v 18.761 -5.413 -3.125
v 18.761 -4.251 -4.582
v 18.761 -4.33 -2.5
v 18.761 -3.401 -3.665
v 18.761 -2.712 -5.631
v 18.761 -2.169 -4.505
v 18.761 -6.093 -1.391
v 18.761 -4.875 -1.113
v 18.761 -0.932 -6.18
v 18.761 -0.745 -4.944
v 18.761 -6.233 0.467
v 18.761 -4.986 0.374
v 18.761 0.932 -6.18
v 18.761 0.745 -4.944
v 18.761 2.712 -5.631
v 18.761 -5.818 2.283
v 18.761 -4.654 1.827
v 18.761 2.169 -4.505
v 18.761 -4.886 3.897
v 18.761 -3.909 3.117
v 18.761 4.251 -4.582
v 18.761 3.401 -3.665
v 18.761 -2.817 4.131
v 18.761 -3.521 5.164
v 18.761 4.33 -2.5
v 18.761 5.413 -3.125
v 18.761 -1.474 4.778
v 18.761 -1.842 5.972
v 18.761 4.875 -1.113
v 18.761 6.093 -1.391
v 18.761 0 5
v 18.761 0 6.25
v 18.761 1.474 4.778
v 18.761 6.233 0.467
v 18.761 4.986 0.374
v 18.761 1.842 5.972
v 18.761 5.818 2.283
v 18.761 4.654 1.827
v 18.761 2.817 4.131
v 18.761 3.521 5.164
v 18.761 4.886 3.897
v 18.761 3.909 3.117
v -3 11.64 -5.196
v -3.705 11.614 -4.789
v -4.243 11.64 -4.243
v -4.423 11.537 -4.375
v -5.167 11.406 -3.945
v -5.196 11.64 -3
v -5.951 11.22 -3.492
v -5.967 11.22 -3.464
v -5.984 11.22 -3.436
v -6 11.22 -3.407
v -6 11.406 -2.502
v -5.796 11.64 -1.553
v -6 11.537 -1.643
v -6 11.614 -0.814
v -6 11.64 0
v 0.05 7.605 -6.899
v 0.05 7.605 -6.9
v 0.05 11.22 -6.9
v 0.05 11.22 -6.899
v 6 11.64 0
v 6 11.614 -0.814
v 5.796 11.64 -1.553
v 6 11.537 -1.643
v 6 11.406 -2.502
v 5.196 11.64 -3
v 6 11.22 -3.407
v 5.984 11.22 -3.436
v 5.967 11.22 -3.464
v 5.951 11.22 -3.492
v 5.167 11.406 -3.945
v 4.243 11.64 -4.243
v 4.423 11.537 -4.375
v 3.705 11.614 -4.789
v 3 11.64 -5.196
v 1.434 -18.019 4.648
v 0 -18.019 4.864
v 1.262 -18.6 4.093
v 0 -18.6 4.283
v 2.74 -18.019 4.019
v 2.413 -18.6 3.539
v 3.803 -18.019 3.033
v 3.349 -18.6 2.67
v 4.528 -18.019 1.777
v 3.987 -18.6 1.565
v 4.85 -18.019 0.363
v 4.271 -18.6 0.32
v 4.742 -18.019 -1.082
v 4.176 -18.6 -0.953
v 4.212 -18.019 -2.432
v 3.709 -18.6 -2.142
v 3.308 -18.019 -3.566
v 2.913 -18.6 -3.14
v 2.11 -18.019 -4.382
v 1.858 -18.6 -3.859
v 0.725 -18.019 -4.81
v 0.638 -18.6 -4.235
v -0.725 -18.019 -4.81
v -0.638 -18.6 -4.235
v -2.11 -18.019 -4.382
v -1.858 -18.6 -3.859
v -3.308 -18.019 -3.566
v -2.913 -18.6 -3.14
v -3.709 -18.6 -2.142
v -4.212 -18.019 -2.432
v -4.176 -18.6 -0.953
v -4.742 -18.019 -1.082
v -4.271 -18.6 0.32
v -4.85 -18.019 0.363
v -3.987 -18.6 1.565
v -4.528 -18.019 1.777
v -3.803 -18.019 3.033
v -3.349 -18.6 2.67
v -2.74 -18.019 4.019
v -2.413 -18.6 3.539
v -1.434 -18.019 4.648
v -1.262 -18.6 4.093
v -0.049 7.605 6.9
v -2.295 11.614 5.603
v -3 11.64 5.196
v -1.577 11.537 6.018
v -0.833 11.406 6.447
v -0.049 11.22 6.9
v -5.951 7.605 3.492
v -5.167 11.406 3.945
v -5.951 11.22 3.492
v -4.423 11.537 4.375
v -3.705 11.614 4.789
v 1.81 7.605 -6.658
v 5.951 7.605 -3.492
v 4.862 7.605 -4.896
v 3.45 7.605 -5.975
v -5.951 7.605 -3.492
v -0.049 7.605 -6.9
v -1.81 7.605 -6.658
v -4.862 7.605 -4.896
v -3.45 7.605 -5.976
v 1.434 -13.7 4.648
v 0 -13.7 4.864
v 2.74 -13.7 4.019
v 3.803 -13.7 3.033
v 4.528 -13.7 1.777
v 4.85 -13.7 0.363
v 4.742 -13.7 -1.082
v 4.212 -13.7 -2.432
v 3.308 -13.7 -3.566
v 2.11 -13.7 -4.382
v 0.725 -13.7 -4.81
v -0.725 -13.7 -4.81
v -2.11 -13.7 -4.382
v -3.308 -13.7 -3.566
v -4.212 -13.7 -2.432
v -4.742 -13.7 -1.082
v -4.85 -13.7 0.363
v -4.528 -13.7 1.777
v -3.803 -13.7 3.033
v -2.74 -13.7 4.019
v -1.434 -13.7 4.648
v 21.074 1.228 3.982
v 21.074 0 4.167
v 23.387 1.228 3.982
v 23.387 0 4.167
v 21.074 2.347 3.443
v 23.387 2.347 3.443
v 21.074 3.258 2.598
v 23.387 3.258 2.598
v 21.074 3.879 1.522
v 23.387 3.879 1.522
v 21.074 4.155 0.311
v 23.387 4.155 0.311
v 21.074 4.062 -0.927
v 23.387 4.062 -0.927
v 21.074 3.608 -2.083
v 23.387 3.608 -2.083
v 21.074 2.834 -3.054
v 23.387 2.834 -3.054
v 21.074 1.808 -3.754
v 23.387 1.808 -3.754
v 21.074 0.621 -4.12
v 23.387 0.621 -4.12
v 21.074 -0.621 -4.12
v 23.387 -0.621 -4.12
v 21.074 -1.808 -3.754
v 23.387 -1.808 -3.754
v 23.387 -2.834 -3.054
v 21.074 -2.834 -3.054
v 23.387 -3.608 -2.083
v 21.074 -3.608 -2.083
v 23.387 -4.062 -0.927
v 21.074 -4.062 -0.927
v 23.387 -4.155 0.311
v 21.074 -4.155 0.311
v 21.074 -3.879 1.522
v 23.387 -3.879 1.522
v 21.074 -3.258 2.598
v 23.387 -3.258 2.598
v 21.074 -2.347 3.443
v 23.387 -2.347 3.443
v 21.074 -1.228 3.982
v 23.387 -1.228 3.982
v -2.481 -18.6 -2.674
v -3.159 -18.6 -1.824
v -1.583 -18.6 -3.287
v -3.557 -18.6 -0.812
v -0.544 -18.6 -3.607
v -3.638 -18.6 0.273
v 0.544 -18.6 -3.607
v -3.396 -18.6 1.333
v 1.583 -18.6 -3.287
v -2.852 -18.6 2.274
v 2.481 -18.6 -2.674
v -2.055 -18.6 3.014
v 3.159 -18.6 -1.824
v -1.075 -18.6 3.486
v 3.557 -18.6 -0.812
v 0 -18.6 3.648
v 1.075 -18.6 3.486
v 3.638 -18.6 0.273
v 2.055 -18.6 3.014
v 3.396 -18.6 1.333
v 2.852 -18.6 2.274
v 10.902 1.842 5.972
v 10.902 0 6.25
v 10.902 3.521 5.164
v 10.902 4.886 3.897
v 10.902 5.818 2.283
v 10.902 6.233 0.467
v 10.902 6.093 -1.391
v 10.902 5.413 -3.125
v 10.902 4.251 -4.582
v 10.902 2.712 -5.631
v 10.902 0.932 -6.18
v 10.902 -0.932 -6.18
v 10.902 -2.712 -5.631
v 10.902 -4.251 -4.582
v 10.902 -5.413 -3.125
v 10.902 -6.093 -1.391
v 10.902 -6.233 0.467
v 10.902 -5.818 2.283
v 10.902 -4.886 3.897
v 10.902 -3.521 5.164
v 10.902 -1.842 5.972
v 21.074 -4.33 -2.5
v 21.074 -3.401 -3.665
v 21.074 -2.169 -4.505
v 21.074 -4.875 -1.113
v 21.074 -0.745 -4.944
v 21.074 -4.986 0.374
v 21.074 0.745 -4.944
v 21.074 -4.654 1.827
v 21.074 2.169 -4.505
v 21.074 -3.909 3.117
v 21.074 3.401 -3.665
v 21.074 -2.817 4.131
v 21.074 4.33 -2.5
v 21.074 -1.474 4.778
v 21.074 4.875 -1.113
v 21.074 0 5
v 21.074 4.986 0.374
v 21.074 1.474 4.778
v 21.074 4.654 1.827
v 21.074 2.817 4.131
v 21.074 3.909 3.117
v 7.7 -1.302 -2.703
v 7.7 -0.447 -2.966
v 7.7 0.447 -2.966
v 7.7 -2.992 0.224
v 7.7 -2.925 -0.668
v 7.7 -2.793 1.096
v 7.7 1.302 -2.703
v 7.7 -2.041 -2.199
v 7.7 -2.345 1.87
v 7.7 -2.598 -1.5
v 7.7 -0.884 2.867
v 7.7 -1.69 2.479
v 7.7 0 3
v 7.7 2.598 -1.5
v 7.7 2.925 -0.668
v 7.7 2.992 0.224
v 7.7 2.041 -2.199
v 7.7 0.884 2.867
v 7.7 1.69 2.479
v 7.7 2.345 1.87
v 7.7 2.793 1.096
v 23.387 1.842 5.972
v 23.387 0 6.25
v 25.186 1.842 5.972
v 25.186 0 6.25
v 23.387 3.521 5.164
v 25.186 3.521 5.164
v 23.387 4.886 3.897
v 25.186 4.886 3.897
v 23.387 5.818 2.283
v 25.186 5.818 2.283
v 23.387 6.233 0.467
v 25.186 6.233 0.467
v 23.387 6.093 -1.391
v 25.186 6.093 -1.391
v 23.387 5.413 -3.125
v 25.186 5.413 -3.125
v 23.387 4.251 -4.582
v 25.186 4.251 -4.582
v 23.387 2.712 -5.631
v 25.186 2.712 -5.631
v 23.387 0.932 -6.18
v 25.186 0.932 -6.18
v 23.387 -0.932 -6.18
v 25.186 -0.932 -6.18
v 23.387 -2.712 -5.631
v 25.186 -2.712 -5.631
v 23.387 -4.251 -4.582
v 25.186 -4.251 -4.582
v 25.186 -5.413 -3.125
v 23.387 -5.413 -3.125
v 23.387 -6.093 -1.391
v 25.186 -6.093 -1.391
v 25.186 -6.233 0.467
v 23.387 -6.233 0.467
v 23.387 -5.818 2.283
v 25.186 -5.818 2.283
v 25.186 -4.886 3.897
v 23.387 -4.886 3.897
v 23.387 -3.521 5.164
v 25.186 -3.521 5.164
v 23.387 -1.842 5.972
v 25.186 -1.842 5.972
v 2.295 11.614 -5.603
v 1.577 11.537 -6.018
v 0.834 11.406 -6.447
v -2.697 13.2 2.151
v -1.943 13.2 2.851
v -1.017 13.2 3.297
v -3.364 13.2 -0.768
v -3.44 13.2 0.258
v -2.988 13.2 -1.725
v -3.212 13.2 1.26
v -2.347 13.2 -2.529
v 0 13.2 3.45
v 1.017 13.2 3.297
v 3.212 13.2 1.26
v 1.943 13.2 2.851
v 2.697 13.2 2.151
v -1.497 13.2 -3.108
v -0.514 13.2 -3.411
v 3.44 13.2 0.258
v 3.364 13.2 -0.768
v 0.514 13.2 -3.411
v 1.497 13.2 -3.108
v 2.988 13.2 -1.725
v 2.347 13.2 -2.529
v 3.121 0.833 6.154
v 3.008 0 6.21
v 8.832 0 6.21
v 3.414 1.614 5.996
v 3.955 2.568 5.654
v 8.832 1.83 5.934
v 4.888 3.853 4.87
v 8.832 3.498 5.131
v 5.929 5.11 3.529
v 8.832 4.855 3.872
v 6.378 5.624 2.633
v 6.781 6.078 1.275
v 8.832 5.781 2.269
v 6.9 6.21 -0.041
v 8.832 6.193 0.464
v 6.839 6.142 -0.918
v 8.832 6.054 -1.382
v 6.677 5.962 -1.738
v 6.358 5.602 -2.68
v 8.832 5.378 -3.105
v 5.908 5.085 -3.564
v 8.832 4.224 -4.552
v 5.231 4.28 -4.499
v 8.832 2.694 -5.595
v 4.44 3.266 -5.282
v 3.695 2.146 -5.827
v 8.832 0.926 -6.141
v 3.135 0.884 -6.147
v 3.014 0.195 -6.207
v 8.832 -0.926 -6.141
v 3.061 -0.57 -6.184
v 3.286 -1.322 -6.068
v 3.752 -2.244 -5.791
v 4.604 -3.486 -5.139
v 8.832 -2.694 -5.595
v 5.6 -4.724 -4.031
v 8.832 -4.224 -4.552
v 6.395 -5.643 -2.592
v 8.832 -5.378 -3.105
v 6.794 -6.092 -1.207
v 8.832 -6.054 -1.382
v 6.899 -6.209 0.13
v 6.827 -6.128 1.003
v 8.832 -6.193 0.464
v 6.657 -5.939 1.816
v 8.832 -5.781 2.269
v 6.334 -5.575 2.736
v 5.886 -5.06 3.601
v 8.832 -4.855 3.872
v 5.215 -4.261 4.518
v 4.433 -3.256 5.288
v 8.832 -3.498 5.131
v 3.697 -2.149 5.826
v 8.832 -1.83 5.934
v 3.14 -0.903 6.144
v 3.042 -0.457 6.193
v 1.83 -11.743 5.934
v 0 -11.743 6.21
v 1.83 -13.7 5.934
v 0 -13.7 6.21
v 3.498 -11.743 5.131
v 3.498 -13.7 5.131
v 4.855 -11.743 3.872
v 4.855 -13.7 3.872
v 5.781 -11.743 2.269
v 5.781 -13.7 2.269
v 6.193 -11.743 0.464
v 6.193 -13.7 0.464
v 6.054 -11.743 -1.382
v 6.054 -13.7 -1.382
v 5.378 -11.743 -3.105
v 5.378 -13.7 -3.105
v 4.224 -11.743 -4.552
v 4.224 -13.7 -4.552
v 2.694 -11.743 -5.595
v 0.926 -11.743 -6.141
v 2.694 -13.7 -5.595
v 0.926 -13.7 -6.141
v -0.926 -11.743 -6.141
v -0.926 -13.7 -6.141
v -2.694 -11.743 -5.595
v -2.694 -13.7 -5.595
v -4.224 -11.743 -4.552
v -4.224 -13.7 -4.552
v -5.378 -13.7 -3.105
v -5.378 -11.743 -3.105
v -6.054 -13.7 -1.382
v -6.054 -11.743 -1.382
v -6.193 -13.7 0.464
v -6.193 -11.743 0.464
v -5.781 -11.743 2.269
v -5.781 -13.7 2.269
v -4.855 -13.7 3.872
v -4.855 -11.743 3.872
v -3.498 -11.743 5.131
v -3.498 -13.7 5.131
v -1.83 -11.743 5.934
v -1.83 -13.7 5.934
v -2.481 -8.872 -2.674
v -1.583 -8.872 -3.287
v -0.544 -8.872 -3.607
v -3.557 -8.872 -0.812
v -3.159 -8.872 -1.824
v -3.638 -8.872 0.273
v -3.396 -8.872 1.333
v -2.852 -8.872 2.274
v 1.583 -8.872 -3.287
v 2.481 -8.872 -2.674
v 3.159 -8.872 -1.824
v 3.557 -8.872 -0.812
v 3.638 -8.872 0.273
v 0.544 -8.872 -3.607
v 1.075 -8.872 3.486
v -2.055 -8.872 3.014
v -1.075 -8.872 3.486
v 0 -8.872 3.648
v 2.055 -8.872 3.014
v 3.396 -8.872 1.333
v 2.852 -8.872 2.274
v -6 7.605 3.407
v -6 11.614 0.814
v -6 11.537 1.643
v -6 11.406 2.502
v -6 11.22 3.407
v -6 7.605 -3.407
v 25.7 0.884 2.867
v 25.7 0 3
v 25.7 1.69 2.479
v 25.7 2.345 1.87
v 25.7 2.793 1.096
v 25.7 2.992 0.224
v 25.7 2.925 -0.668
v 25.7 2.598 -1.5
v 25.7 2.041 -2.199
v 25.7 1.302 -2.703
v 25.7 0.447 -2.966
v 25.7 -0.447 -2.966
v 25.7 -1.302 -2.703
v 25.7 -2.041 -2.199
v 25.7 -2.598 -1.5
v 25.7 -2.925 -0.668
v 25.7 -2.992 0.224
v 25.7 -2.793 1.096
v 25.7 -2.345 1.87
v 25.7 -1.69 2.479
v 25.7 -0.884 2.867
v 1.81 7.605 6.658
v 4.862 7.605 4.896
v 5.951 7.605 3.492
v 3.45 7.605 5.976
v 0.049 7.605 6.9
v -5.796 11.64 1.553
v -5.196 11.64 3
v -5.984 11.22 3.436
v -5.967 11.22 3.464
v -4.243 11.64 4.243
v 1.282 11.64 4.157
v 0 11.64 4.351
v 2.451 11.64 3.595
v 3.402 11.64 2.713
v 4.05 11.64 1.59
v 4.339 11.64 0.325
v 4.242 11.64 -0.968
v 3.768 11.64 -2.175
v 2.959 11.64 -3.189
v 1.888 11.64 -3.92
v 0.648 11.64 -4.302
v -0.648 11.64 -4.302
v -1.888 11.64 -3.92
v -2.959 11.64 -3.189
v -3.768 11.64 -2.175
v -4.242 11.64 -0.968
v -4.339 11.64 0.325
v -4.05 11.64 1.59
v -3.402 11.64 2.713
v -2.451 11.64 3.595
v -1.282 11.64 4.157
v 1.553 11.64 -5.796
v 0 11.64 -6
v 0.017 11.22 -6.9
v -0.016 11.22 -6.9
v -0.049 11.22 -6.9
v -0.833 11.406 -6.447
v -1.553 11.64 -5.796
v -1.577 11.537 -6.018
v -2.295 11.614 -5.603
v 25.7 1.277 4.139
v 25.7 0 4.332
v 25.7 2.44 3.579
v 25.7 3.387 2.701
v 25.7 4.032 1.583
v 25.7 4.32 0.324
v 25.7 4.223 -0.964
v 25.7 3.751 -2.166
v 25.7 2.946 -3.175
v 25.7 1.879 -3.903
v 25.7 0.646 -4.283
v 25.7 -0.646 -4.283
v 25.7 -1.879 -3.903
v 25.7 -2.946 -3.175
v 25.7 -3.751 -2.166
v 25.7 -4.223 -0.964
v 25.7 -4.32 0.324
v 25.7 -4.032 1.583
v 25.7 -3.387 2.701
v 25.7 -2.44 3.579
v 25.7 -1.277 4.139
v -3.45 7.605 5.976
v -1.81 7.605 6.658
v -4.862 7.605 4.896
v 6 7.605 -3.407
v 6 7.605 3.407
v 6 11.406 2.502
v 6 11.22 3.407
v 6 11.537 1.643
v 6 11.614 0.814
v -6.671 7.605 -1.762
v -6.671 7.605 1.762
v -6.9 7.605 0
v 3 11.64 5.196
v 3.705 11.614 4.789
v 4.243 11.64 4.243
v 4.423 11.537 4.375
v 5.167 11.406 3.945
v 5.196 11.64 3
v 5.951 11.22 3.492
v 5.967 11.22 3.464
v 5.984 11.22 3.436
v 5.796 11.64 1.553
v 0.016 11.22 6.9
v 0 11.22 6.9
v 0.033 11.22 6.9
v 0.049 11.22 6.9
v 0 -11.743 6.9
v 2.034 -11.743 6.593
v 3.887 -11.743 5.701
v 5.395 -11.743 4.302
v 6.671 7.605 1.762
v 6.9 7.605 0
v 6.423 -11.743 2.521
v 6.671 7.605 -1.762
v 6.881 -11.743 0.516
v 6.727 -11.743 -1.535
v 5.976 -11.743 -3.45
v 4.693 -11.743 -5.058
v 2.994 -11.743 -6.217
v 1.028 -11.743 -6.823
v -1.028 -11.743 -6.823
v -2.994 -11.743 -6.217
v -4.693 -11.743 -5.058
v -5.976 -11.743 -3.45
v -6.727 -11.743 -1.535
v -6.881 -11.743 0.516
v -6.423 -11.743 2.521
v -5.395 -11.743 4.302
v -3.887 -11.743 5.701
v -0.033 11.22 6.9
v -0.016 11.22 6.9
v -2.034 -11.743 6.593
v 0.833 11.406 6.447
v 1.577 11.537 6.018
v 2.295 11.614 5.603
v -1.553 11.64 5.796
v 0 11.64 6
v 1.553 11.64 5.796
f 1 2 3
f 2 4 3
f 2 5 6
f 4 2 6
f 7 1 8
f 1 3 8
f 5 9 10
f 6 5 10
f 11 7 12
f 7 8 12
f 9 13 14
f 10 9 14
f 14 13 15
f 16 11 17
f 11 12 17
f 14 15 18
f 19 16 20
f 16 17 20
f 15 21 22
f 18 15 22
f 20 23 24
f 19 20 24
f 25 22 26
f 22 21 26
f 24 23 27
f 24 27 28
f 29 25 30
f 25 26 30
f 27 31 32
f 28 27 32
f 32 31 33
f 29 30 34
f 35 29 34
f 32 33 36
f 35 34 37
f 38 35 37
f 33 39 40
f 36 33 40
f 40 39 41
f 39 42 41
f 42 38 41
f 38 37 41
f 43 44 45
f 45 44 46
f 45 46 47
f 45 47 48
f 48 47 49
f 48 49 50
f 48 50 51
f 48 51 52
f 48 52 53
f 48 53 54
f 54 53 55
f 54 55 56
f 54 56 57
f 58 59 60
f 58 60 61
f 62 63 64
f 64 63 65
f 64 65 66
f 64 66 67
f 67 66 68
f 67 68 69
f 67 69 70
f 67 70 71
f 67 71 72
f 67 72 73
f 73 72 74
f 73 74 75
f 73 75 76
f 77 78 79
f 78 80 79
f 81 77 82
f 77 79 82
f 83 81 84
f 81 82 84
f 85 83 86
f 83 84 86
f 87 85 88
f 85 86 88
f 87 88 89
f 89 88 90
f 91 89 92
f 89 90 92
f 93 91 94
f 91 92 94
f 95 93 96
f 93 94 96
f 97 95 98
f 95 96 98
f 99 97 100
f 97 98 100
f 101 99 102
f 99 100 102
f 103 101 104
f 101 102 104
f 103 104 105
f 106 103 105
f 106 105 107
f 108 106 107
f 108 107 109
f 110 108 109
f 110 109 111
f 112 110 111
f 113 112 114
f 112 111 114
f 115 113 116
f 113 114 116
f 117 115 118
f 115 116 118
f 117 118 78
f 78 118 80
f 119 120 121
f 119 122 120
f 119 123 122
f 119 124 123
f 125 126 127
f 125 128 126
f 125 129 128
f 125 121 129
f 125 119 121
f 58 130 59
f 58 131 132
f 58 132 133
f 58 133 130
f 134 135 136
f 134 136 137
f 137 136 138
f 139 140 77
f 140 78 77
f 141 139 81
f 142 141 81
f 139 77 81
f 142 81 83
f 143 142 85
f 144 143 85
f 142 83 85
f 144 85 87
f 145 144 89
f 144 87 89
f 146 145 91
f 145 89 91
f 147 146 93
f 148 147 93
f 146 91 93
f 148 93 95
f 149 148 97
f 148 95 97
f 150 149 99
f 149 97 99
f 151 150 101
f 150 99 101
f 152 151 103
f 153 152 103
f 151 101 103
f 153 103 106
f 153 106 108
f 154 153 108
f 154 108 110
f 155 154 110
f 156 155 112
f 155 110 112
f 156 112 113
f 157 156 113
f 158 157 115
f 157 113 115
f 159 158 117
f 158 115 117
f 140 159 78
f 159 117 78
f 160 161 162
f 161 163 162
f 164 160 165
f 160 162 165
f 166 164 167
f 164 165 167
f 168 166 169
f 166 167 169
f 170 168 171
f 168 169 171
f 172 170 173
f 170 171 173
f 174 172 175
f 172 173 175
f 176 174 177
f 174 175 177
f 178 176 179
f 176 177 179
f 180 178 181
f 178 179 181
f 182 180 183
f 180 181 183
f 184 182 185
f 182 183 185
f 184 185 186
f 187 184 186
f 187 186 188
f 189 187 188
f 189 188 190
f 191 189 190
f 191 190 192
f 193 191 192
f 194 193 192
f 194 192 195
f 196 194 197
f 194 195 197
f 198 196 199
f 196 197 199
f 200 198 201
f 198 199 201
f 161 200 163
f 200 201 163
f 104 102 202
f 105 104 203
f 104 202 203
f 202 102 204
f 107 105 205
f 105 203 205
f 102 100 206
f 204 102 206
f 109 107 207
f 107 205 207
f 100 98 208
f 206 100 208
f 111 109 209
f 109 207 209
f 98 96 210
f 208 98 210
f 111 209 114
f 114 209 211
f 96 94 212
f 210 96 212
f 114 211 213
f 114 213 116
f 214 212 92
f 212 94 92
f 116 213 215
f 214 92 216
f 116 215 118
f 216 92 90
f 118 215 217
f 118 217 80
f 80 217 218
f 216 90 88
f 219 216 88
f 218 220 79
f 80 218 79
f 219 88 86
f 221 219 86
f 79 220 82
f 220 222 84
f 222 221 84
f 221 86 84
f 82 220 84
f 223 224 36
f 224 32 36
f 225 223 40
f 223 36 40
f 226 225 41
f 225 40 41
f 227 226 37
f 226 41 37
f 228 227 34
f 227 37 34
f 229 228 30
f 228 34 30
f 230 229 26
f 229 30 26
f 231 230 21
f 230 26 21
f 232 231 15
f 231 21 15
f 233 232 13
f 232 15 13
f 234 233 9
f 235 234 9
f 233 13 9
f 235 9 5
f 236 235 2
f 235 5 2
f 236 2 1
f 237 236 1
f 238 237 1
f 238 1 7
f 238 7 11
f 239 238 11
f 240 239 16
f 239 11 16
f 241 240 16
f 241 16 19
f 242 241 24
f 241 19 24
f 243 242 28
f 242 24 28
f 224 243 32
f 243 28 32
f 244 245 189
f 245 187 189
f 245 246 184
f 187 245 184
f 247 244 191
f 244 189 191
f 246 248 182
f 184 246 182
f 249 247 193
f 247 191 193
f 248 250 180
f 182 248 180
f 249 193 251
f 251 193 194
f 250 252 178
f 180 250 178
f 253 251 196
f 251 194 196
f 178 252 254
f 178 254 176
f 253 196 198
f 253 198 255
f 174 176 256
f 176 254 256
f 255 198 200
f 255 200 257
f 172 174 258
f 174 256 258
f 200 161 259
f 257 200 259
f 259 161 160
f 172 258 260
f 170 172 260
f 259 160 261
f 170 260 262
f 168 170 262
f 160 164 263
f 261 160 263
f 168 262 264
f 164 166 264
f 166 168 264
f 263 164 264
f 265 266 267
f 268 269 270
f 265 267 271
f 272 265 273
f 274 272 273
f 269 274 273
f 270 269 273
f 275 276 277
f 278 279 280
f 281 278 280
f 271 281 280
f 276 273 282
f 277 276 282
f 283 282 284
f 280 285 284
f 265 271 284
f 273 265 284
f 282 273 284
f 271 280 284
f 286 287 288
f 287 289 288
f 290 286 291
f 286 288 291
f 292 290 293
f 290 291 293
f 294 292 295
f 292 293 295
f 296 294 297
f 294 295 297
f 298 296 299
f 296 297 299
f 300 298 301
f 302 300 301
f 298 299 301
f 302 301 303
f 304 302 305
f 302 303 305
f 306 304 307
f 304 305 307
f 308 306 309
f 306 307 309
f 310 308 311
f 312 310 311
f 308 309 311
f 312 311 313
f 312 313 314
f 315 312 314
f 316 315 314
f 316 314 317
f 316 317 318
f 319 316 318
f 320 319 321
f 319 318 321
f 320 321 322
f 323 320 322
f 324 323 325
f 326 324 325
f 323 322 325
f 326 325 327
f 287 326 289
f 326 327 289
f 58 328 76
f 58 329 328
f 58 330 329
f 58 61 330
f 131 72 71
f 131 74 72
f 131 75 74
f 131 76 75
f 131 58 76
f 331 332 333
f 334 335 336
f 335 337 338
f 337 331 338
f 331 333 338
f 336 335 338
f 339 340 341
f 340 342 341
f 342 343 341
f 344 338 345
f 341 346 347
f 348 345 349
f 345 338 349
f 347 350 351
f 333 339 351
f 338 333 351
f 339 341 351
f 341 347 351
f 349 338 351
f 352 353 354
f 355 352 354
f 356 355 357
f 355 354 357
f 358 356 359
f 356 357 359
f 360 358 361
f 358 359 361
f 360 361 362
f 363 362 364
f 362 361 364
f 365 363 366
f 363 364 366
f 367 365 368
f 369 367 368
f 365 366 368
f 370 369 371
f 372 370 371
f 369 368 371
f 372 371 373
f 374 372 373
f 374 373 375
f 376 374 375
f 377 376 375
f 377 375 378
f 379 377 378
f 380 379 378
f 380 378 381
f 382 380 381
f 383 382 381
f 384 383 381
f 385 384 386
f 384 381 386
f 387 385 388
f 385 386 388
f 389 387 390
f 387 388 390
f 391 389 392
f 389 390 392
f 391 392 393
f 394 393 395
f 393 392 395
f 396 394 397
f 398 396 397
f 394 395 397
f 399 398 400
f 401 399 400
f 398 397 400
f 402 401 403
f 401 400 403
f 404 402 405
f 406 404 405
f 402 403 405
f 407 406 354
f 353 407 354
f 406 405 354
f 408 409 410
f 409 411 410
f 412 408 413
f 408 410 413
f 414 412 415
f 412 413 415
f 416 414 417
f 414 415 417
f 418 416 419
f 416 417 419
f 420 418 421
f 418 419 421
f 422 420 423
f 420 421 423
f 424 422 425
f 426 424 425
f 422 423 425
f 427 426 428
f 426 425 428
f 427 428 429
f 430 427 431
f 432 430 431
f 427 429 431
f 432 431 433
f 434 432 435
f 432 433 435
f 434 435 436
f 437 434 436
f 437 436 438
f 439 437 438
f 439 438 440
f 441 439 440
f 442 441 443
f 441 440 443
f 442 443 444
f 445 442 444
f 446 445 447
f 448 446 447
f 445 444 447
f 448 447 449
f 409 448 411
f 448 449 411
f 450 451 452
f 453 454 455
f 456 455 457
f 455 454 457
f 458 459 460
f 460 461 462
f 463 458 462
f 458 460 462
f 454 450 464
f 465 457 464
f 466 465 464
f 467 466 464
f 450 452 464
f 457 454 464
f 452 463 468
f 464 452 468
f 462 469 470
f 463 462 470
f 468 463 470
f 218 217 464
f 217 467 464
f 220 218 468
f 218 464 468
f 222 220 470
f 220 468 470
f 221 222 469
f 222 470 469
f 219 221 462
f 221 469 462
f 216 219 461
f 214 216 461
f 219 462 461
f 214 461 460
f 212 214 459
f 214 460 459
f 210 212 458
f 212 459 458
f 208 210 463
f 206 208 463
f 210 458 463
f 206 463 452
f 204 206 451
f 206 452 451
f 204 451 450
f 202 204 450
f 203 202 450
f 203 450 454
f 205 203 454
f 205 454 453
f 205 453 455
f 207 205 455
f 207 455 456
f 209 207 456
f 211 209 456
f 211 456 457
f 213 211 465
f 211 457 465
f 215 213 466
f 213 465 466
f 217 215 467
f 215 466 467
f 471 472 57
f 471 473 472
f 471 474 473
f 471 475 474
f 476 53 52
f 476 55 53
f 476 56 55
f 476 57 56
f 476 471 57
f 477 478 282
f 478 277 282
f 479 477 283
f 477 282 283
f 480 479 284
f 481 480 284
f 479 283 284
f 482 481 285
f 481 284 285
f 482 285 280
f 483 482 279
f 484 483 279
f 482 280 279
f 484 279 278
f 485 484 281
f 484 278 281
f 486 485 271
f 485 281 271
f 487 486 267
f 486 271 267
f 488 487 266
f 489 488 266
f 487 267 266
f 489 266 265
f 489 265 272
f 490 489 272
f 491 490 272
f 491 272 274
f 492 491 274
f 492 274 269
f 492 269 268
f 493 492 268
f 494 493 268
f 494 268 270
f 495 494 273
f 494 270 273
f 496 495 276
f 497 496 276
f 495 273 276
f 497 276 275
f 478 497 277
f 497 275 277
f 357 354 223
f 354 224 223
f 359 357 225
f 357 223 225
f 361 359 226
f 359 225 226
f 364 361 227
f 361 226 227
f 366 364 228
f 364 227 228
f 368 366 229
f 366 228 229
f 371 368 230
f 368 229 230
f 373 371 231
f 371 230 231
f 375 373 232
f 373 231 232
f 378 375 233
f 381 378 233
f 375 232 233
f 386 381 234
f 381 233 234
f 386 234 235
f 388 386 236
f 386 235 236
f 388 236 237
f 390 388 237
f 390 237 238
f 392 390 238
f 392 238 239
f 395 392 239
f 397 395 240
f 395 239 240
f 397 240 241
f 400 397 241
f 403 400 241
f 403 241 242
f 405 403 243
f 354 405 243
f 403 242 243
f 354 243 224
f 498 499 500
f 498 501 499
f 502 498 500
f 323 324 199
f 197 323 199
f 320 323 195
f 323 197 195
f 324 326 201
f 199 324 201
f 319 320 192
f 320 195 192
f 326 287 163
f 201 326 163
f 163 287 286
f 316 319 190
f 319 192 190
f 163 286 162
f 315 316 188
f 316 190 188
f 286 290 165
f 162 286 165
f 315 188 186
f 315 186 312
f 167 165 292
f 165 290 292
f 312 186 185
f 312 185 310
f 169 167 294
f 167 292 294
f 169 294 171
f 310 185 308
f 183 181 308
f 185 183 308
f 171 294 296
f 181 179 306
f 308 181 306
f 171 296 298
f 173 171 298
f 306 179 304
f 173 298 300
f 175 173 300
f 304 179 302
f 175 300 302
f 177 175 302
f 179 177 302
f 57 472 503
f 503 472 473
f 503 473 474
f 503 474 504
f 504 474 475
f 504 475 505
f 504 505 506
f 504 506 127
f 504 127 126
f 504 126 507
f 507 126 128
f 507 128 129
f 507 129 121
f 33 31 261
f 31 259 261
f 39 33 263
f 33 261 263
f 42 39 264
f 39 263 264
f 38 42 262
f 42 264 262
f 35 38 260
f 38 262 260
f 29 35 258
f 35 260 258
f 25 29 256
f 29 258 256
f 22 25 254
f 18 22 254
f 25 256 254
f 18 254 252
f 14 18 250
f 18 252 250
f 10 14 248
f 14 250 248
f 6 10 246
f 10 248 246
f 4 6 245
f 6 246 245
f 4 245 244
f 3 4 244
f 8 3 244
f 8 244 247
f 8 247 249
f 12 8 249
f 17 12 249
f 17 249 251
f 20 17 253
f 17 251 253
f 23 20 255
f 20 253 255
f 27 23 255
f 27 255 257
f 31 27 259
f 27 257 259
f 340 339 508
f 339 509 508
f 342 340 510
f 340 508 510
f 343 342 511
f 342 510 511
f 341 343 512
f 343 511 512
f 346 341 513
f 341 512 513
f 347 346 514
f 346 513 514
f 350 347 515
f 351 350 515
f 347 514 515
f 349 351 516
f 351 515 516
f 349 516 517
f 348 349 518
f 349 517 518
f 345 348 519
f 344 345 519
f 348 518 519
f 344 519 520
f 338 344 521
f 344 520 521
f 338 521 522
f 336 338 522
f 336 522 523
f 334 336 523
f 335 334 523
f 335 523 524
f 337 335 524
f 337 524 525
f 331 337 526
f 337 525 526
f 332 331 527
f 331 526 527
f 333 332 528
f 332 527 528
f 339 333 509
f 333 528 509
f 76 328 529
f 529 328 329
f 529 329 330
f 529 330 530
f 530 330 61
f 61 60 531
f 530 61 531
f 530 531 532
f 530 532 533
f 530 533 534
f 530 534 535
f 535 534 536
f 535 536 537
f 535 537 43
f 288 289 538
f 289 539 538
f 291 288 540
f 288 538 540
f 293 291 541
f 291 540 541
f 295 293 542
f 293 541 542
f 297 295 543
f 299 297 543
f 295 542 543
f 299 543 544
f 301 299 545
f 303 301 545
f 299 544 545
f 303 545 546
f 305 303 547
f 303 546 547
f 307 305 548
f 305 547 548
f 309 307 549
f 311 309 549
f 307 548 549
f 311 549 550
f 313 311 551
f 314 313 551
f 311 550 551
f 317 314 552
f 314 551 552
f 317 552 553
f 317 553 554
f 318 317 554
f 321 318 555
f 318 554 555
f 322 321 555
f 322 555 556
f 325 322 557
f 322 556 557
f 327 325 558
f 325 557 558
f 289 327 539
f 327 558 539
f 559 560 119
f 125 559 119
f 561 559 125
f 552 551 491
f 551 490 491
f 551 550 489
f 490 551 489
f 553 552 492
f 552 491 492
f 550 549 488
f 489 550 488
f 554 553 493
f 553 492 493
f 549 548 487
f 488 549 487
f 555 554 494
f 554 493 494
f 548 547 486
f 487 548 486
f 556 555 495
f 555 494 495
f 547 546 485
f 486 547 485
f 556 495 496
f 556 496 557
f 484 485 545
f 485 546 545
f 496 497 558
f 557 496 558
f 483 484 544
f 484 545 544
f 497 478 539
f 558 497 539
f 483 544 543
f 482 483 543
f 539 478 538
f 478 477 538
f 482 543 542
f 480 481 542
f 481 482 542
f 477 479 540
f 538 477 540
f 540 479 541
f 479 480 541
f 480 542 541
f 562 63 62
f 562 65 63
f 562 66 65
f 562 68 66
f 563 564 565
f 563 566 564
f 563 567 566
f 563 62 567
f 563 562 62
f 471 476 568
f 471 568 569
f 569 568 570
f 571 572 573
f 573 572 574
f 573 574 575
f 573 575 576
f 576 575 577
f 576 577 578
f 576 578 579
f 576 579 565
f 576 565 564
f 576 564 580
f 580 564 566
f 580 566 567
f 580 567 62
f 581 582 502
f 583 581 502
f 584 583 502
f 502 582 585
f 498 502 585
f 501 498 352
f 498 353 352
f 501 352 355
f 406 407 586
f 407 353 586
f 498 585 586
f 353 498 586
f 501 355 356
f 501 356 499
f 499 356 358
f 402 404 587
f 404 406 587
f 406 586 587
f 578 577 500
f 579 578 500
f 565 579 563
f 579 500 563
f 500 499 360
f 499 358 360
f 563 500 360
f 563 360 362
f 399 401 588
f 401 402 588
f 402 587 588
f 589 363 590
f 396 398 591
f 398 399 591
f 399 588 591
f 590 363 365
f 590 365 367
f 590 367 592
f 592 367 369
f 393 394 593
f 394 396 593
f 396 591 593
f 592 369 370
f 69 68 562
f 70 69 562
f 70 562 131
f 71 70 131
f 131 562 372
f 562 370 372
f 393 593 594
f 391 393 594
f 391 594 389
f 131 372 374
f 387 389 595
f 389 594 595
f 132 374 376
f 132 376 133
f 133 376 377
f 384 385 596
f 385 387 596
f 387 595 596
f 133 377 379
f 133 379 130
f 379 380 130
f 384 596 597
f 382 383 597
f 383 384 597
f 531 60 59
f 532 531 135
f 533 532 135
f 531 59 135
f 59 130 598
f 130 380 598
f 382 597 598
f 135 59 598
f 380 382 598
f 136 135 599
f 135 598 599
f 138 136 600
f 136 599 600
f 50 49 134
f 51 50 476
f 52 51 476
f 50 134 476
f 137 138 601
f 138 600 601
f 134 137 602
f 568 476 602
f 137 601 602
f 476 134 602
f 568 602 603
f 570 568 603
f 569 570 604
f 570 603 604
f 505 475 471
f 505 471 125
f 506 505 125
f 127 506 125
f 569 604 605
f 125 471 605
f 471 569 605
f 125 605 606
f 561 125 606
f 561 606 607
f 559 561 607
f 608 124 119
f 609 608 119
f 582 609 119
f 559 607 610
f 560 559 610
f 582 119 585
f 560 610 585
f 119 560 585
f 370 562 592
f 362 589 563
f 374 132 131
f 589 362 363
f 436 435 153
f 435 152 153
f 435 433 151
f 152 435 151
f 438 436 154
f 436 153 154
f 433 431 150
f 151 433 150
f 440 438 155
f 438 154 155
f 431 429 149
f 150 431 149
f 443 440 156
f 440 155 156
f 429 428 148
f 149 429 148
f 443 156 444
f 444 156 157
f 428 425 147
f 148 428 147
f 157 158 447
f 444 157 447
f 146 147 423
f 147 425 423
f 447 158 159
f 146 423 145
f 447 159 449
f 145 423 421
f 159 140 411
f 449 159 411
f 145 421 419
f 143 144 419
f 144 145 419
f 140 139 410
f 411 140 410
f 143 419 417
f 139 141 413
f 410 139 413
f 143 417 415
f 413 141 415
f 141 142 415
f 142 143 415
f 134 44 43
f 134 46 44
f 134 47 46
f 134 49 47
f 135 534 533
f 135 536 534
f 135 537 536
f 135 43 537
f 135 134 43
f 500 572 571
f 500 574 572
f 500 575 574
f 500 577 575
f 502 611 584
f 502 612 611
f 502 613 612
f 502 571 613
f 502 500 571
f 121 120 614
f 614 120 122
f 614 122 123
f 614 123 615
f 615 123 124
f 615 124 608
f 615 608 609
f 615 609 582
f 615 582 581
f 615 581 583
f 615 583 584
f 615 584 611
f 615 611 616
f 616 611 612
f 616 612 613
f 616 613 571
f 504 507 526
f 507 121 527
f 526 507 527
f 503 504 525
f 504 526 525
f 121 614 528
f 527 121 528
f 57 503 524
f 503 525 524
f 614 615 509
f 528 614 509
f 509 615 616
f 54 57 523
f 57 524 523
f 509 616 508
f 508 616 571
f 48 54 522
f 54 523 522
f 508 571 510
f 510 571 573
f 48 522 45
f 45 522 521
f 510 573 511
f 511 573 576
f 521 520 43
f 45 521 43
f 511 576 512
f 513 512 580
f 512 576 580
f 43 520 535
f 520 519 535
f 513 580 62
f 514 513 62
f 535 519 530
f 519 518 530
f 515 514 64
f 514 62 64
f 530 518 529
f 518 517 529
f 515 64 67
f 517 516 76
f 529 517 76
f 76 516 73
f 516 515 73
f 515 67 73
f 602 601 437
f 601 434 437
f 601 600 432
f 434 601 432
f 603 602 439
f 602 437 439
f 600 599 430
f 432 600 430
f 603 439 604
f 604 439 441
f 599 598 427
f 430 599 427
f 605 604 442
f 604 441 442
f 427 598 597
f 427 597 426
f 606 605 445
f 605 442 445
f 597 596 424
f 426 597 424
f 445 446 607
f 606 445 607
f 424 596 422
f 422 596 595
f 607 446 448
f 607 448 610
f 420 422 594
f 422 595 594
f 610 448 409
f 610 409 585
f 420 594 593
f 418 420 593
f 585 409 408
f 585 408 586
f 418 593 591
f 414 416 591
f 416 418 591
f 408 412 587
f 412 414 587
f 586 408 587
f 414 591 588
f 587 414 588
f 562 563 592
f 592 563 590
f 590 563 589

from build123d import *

# Parameters (mm, degrees)
LINEAR_AUSTRAGEN1_DEPTH      = 4.035
LINEAR_AUSTRAGEN1_DEPTH_BACK = 4.035


with BuildPart() as part:
    # Skizze1 → Rotation1 (revolve)
    with BuildSketch(Plane.XY, mode=Mode.PRIVATE) as rotation1_sk:
        Polygon((0, 13.2), (3.45, 13.2), (4.35078189, 11.6398), (6, 11.6398), (6.9, 11.220123108), (6.9, -11.742857143), (6.21, -11.742857143), (6.21, -13.7), (4.864, -13.7), (4.864, -18.019), (4.283, -18.6), (3.648, -18.6), (3.648, -8.872), (0, -8.872), align=None)
    revolve(rotation1_sk.sketch.rotate(Axis((0, -18.6, 0), (0, 1, 0)), 270), axis=Axis((0, -18.6, 0), (0, 1, 0)))

    # Skizze2 → Linear austragen1 (cut, two sides: drawn at the far end of the back side and taken through both)
    with BuildSketch(Plane(origin=(0, 11.6398, 0), x_dir=(-1, 0, 0), z_dir=(0, 1, 0)).offset(-LINEAR_AUSTRAGEN1_DEPTH_BACK)):
        Polygon((7.8, -4.5033321), (7.8, 4.5033321), (0, 9.006664199), (-7.8, 4.5033321), (-7.8, -4.5033321), (-0.05, -8.977796686), (-0.05, -6.899335717), (-6, -3.464101615), (-6, 3.464101615), (0, 6.92820323), (6, 3.464101615), (6, -3.464101615), (0, -6.92820323), (0, -9.006664199), align=None)
    extrude(amount=LINEAR_AUSTRAGEN1_DEPTH + LINEAR_AUSTRAGEN1_DEPTH_BACK, mode=Mode.SUBTRACT)

    # Skizze3 → Rotation2 (revolve)
    with BuildSketch(Plane.XY, mode=Mode.PRIVATE) as rotation2_sk:
        Polygon((0, 0), (0, 6.21), (8.832, 6.21), (10.902, 6.25), (18.761, 6.25), (18.761, 5), (21.074, 5), (21.074, 4.166666667), (23.387, 4.166666667), (23.387, 6.25), (25.186, 6.25), (25.7, 4.331725885), (25.7, 3), (7.7, 3), (7.7, 0), align=None)
    revolve(rotation2_sk.sketch.rotate(Axis((25.7, 0, 0), (-1, 0, 0)), 270), axis=Axis((25.7, 0, 0), (-1, 0, 0)))


solid = part.part
